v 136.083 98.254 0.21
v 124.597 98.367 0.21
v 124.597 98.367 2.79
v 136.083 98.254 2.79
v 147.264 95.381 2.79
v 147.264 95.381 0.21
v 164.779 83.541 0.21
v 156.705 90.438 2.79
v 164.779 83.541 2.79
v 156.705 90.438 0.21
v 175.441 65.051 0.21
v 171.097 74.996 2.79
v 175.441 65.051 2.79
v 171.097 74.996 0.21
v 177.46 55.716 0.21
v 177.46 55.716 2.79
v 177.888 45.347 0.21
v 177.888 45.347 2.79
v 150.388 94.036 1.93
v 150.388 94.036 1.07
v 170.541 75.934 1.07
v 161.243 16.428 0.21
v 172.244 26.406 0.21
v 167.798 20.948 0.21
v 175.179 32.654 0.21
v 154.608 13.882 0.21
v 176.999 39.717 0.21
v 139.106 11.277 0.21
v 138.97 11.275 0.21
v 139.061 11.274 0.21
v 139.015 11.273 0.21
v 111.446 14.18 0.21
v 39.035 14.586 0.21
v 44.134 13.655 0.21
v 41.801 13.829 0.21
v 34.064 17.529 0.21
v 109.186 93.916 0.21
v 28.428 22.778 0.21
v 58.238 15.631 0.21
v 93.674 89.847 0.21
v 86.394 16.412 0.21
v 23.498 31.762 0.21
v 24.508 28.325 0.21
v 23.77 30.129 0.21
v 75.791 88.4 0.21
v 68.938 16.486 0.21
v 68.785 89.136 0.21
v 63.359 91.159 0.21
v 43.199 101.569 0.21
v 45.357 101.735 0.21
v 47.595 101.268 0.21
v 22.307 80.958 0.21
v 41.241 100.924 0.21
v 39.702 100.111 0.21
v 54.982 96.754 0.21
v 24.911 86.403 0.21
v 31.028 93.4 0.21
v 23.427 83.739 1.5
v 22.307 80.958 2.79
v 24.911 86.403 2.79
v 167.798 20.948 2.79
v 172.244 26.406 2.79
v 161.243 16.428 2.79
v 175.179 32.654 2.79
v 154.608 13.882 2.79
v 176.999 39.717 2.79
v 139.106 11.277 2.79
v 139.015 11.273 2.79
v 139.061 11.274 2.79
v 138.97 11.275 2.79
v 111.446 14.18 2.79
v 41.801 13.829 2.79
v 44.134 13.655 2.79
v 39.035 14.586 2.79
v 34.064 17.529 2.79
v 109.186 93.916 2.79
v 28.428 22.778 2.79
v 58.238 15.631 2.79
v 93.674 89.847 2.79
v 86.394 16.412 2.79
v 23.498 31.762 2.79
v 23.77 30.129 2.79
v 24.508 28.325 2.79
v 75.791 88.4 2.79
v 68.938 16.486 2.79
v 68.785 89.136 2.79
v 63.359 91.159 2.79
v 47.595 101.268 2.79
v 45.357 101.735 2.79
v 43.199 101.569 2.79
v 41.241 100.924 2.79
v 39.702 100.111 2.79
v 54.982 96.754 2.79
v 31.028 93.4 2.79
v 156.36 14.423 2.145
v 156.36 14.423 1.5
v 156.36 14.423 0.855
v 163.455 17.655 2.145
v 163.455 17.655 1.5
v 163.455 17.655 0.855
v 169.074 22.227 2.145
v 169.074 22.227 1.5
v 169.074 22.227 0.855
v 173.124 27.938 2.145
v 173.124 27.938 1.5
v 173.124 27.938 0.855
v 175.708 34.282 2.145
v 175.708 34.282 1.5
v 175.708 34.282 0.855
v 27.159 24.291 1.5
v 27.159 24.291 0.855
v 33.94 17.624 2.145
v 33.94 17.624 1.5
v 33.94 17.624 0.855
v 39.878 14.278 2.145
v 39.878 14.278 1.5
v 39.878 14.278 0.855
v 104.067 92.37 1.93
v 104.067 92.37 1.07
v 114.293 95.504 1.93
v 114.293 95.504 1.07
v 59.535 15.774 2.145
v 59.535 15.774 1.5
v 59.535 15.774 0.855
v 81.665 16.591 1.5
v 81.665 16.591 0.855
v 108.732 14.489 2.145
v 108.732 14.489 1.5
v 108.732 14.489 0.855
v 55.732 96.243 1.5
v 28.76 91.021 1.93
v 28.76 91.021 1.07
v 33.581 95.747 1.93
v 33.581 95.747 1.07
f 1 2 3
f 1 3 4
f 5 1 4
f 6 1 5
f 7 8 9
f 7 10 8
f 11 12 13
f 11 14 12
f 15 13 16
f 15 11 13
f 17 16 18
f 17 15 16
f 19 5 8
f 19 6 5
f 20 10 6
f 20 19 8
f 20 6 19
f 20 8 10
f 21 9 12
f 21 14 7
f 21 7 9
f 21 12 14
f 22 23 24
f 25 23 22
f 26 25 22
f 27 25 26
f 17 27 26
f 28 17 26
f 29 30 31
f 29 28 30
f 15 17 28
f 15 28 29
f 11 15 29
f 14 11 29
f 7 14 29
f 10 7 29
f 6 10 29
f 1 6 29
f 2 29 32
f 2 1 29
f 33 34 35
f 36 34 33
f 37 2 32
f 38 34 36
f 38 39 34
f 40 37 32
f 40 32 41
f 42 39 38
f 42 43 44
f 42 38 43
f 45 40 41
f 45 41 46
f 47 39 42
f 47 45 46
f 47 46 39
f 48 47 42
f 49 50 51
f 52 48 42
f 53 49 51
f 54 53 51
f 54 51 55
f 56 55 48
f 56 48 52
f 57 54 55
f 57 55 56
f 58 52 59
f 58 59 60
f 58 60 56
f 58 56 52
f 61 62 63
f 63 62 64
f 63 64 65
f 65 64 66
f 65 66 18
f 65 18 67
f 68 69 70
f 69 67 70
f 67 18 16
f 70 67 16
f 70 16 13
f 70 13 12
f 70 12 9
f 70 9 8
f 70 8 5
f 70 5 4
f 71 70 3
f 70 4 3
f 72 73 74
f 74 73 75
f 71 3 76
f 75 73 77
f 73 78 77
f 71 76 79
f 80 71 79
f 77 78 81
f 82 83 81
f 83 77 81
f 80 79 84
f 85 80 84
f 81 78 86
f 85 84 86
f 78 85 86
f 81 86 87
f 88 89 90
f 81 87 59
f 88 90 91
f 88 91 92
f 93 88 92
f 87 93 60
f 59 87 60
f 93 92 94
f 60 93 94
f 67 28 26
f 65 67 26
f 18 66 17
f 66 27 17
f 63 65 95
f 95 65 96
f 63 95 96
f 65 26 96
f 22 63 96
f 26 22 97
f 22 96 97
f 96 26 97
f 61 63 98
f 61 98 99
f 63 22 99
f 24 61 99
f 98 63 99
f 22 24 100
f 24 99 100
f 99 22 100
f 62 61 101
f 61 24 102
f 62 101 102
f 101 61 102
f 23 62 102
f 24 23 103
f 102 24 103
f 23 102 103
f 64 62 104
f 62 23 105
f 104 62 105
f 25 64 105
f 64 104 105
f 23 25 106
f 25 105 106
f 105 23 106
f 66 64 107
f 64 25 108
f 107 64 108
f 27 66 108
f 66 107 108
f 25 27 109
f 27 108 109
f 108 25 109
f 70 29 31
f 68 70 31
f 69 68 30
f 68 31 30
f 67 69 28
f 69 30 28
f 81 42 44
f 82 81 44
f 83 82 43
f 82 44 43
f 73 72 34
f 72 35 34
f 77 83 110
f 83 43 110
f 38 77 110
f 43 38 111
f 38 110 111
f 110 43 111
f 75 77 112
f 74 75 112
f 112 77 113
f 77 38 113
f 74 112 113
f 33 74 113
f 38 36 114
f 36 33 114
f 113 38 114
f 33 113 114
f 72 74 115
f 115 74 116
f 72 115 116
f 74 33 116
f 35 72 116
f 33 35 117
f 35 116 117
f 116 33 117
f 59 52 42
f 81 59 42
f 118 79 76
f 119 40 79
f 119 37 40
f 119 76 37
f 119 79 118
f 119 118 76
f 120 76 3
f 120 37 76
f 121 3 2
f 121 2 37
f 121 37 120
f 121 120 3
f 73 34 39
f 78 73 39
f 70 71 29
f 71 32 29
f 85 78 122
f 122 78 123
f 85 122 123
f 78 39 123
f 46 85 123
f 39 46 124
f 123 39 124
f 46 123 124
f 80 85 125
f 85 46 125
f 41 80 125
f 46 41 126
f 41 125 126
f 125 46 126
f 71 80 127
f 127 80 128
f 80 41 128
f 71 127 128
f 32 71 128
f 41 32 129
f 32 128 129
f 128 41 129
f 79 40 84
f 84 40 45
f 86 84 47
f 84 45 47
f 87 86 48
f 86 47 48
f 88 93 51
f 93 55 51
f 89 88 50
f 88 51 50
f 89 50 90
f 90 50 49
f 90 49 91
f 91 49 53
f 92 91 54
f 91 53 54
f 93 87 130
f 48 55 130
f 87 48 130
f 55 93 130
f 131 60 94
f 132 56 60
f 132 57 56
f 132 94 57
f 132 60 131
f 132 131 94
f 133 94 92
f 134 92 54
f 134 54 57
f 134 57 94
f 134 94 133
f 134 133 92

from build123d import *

# Parameters (mm, degrees)
BOSS_EXTRUDE4_DEPTH = 3
SCALE1_SCALE        = 0.86


# Read off the part's stored shape, not the designer's step: Boss-Extrude4
with BuildPart() as part:
    # Boss-Extrude4 outline → Boss-Extrude4 (new body)
    with BuildSketch(Plane.XY):
        with BuildLine():
            add(Edge.make_bspline(
                [(128.82833309, 105.536623813), (159.315788443, 109.006350456), (192.475992382, 86.212295483), (190.794375589, 43.885867645)],
                knots=[0, 0, 0, 0, 1, 1, 1, 1], degree=3))
            add(Edge.make_bspline(
                [(92.87165983, 95.629562044), (105.148722359, 97.866221646), (116.705848504, 102.706993295), (128.82833309, 105.536623813)],
                knots=[0, 0, 0, 0, 1, 1, 1, 1], degree=3))
            add(Edge.make_bspline(
                [(92.87165983, 95.629562044), (78.874553109, 93.684568119), (61.0348089, 92.108576277), (59.272608111, 95.97566045), (41.403108896, 108.020274617), (38.175658748, 111.707809956), (32.53925388, 109.060669967), (30.113522357, 107.565046253)],
                knots=[0, 0, 0, 0, 0, 1, 1, 1, 1.698662339, 1.698662339, 1.698662339, 1.698662339, 1.698662339], degree=4))
            add(Edge.make_bspline(
                [(12.914792947, 91.625113761), (16.949837177, 96.750446573), (22.113989283, 102.883143014), (30.113522357, 107.565046253)],
                knots=[0, 0, 0, 0, 1, 1, 1, 1], degree=3))
            add(Edge.make_bspline(
                [(9.886852416, 85.293194855), (10.97741097, 88.595155789), (12.914792947, 91.625113761)],
                knots=[0, 0, 0, 1, 1, 1], degree=2))
            Line((9.886852416, 85.293194855), (11.271471488, 28.088427646))
            add(Edge.make_bspline(
                [(11.271471488, 28.088427646), (11.271471488, 20.815583109), (26.686574013, 6.45868902), (30.71485135, 7.312076366), (35.266090121, 7.033710678)],
                knots=[0, 0, 0, 0, 0, 1, 1, 1, 1, 1], degree=4))
            add(Edge.make_bspline(
                [(35.266090121, 7.033710678), (48.561112758, 8.632251116), (75.101234368, 15.586721231), (109.214272404, 6.953370257), (145.540382928, 4.267266007)],
                knots=[0, 0, 0, 0, 0, 1, 1, 1, 1, 1], degree=4))
            ThreePointArc((145.540382928, 4.267266007), (145.619959196, 4.264912487), (145.69943212, 4.269600342))
            add(Edge.make_bspline(
                [(145.69943212, 4.269600342), (166.885614368, 6.462982074), (187.913311107, 9.653551401), (189.301900074, 35.0267482), (190.794375589, 43.885867645)],
                knots=[0, 0, 0, 0, 0, 1, 1, 1, 1, 1], degree=4))
        make_face()
    extrude(amount=BOSS_EXTRUDE4_DEPTH)


with BuildPart() as part_1:
    # Scale1: scaled about (98.605522213, 54.325229802, 1.5)
    add(part.part.scale(SCALE1_SCALE).moved(Location((13.80477311, 7.605532172, 0.21))))


solid = part_1.part
